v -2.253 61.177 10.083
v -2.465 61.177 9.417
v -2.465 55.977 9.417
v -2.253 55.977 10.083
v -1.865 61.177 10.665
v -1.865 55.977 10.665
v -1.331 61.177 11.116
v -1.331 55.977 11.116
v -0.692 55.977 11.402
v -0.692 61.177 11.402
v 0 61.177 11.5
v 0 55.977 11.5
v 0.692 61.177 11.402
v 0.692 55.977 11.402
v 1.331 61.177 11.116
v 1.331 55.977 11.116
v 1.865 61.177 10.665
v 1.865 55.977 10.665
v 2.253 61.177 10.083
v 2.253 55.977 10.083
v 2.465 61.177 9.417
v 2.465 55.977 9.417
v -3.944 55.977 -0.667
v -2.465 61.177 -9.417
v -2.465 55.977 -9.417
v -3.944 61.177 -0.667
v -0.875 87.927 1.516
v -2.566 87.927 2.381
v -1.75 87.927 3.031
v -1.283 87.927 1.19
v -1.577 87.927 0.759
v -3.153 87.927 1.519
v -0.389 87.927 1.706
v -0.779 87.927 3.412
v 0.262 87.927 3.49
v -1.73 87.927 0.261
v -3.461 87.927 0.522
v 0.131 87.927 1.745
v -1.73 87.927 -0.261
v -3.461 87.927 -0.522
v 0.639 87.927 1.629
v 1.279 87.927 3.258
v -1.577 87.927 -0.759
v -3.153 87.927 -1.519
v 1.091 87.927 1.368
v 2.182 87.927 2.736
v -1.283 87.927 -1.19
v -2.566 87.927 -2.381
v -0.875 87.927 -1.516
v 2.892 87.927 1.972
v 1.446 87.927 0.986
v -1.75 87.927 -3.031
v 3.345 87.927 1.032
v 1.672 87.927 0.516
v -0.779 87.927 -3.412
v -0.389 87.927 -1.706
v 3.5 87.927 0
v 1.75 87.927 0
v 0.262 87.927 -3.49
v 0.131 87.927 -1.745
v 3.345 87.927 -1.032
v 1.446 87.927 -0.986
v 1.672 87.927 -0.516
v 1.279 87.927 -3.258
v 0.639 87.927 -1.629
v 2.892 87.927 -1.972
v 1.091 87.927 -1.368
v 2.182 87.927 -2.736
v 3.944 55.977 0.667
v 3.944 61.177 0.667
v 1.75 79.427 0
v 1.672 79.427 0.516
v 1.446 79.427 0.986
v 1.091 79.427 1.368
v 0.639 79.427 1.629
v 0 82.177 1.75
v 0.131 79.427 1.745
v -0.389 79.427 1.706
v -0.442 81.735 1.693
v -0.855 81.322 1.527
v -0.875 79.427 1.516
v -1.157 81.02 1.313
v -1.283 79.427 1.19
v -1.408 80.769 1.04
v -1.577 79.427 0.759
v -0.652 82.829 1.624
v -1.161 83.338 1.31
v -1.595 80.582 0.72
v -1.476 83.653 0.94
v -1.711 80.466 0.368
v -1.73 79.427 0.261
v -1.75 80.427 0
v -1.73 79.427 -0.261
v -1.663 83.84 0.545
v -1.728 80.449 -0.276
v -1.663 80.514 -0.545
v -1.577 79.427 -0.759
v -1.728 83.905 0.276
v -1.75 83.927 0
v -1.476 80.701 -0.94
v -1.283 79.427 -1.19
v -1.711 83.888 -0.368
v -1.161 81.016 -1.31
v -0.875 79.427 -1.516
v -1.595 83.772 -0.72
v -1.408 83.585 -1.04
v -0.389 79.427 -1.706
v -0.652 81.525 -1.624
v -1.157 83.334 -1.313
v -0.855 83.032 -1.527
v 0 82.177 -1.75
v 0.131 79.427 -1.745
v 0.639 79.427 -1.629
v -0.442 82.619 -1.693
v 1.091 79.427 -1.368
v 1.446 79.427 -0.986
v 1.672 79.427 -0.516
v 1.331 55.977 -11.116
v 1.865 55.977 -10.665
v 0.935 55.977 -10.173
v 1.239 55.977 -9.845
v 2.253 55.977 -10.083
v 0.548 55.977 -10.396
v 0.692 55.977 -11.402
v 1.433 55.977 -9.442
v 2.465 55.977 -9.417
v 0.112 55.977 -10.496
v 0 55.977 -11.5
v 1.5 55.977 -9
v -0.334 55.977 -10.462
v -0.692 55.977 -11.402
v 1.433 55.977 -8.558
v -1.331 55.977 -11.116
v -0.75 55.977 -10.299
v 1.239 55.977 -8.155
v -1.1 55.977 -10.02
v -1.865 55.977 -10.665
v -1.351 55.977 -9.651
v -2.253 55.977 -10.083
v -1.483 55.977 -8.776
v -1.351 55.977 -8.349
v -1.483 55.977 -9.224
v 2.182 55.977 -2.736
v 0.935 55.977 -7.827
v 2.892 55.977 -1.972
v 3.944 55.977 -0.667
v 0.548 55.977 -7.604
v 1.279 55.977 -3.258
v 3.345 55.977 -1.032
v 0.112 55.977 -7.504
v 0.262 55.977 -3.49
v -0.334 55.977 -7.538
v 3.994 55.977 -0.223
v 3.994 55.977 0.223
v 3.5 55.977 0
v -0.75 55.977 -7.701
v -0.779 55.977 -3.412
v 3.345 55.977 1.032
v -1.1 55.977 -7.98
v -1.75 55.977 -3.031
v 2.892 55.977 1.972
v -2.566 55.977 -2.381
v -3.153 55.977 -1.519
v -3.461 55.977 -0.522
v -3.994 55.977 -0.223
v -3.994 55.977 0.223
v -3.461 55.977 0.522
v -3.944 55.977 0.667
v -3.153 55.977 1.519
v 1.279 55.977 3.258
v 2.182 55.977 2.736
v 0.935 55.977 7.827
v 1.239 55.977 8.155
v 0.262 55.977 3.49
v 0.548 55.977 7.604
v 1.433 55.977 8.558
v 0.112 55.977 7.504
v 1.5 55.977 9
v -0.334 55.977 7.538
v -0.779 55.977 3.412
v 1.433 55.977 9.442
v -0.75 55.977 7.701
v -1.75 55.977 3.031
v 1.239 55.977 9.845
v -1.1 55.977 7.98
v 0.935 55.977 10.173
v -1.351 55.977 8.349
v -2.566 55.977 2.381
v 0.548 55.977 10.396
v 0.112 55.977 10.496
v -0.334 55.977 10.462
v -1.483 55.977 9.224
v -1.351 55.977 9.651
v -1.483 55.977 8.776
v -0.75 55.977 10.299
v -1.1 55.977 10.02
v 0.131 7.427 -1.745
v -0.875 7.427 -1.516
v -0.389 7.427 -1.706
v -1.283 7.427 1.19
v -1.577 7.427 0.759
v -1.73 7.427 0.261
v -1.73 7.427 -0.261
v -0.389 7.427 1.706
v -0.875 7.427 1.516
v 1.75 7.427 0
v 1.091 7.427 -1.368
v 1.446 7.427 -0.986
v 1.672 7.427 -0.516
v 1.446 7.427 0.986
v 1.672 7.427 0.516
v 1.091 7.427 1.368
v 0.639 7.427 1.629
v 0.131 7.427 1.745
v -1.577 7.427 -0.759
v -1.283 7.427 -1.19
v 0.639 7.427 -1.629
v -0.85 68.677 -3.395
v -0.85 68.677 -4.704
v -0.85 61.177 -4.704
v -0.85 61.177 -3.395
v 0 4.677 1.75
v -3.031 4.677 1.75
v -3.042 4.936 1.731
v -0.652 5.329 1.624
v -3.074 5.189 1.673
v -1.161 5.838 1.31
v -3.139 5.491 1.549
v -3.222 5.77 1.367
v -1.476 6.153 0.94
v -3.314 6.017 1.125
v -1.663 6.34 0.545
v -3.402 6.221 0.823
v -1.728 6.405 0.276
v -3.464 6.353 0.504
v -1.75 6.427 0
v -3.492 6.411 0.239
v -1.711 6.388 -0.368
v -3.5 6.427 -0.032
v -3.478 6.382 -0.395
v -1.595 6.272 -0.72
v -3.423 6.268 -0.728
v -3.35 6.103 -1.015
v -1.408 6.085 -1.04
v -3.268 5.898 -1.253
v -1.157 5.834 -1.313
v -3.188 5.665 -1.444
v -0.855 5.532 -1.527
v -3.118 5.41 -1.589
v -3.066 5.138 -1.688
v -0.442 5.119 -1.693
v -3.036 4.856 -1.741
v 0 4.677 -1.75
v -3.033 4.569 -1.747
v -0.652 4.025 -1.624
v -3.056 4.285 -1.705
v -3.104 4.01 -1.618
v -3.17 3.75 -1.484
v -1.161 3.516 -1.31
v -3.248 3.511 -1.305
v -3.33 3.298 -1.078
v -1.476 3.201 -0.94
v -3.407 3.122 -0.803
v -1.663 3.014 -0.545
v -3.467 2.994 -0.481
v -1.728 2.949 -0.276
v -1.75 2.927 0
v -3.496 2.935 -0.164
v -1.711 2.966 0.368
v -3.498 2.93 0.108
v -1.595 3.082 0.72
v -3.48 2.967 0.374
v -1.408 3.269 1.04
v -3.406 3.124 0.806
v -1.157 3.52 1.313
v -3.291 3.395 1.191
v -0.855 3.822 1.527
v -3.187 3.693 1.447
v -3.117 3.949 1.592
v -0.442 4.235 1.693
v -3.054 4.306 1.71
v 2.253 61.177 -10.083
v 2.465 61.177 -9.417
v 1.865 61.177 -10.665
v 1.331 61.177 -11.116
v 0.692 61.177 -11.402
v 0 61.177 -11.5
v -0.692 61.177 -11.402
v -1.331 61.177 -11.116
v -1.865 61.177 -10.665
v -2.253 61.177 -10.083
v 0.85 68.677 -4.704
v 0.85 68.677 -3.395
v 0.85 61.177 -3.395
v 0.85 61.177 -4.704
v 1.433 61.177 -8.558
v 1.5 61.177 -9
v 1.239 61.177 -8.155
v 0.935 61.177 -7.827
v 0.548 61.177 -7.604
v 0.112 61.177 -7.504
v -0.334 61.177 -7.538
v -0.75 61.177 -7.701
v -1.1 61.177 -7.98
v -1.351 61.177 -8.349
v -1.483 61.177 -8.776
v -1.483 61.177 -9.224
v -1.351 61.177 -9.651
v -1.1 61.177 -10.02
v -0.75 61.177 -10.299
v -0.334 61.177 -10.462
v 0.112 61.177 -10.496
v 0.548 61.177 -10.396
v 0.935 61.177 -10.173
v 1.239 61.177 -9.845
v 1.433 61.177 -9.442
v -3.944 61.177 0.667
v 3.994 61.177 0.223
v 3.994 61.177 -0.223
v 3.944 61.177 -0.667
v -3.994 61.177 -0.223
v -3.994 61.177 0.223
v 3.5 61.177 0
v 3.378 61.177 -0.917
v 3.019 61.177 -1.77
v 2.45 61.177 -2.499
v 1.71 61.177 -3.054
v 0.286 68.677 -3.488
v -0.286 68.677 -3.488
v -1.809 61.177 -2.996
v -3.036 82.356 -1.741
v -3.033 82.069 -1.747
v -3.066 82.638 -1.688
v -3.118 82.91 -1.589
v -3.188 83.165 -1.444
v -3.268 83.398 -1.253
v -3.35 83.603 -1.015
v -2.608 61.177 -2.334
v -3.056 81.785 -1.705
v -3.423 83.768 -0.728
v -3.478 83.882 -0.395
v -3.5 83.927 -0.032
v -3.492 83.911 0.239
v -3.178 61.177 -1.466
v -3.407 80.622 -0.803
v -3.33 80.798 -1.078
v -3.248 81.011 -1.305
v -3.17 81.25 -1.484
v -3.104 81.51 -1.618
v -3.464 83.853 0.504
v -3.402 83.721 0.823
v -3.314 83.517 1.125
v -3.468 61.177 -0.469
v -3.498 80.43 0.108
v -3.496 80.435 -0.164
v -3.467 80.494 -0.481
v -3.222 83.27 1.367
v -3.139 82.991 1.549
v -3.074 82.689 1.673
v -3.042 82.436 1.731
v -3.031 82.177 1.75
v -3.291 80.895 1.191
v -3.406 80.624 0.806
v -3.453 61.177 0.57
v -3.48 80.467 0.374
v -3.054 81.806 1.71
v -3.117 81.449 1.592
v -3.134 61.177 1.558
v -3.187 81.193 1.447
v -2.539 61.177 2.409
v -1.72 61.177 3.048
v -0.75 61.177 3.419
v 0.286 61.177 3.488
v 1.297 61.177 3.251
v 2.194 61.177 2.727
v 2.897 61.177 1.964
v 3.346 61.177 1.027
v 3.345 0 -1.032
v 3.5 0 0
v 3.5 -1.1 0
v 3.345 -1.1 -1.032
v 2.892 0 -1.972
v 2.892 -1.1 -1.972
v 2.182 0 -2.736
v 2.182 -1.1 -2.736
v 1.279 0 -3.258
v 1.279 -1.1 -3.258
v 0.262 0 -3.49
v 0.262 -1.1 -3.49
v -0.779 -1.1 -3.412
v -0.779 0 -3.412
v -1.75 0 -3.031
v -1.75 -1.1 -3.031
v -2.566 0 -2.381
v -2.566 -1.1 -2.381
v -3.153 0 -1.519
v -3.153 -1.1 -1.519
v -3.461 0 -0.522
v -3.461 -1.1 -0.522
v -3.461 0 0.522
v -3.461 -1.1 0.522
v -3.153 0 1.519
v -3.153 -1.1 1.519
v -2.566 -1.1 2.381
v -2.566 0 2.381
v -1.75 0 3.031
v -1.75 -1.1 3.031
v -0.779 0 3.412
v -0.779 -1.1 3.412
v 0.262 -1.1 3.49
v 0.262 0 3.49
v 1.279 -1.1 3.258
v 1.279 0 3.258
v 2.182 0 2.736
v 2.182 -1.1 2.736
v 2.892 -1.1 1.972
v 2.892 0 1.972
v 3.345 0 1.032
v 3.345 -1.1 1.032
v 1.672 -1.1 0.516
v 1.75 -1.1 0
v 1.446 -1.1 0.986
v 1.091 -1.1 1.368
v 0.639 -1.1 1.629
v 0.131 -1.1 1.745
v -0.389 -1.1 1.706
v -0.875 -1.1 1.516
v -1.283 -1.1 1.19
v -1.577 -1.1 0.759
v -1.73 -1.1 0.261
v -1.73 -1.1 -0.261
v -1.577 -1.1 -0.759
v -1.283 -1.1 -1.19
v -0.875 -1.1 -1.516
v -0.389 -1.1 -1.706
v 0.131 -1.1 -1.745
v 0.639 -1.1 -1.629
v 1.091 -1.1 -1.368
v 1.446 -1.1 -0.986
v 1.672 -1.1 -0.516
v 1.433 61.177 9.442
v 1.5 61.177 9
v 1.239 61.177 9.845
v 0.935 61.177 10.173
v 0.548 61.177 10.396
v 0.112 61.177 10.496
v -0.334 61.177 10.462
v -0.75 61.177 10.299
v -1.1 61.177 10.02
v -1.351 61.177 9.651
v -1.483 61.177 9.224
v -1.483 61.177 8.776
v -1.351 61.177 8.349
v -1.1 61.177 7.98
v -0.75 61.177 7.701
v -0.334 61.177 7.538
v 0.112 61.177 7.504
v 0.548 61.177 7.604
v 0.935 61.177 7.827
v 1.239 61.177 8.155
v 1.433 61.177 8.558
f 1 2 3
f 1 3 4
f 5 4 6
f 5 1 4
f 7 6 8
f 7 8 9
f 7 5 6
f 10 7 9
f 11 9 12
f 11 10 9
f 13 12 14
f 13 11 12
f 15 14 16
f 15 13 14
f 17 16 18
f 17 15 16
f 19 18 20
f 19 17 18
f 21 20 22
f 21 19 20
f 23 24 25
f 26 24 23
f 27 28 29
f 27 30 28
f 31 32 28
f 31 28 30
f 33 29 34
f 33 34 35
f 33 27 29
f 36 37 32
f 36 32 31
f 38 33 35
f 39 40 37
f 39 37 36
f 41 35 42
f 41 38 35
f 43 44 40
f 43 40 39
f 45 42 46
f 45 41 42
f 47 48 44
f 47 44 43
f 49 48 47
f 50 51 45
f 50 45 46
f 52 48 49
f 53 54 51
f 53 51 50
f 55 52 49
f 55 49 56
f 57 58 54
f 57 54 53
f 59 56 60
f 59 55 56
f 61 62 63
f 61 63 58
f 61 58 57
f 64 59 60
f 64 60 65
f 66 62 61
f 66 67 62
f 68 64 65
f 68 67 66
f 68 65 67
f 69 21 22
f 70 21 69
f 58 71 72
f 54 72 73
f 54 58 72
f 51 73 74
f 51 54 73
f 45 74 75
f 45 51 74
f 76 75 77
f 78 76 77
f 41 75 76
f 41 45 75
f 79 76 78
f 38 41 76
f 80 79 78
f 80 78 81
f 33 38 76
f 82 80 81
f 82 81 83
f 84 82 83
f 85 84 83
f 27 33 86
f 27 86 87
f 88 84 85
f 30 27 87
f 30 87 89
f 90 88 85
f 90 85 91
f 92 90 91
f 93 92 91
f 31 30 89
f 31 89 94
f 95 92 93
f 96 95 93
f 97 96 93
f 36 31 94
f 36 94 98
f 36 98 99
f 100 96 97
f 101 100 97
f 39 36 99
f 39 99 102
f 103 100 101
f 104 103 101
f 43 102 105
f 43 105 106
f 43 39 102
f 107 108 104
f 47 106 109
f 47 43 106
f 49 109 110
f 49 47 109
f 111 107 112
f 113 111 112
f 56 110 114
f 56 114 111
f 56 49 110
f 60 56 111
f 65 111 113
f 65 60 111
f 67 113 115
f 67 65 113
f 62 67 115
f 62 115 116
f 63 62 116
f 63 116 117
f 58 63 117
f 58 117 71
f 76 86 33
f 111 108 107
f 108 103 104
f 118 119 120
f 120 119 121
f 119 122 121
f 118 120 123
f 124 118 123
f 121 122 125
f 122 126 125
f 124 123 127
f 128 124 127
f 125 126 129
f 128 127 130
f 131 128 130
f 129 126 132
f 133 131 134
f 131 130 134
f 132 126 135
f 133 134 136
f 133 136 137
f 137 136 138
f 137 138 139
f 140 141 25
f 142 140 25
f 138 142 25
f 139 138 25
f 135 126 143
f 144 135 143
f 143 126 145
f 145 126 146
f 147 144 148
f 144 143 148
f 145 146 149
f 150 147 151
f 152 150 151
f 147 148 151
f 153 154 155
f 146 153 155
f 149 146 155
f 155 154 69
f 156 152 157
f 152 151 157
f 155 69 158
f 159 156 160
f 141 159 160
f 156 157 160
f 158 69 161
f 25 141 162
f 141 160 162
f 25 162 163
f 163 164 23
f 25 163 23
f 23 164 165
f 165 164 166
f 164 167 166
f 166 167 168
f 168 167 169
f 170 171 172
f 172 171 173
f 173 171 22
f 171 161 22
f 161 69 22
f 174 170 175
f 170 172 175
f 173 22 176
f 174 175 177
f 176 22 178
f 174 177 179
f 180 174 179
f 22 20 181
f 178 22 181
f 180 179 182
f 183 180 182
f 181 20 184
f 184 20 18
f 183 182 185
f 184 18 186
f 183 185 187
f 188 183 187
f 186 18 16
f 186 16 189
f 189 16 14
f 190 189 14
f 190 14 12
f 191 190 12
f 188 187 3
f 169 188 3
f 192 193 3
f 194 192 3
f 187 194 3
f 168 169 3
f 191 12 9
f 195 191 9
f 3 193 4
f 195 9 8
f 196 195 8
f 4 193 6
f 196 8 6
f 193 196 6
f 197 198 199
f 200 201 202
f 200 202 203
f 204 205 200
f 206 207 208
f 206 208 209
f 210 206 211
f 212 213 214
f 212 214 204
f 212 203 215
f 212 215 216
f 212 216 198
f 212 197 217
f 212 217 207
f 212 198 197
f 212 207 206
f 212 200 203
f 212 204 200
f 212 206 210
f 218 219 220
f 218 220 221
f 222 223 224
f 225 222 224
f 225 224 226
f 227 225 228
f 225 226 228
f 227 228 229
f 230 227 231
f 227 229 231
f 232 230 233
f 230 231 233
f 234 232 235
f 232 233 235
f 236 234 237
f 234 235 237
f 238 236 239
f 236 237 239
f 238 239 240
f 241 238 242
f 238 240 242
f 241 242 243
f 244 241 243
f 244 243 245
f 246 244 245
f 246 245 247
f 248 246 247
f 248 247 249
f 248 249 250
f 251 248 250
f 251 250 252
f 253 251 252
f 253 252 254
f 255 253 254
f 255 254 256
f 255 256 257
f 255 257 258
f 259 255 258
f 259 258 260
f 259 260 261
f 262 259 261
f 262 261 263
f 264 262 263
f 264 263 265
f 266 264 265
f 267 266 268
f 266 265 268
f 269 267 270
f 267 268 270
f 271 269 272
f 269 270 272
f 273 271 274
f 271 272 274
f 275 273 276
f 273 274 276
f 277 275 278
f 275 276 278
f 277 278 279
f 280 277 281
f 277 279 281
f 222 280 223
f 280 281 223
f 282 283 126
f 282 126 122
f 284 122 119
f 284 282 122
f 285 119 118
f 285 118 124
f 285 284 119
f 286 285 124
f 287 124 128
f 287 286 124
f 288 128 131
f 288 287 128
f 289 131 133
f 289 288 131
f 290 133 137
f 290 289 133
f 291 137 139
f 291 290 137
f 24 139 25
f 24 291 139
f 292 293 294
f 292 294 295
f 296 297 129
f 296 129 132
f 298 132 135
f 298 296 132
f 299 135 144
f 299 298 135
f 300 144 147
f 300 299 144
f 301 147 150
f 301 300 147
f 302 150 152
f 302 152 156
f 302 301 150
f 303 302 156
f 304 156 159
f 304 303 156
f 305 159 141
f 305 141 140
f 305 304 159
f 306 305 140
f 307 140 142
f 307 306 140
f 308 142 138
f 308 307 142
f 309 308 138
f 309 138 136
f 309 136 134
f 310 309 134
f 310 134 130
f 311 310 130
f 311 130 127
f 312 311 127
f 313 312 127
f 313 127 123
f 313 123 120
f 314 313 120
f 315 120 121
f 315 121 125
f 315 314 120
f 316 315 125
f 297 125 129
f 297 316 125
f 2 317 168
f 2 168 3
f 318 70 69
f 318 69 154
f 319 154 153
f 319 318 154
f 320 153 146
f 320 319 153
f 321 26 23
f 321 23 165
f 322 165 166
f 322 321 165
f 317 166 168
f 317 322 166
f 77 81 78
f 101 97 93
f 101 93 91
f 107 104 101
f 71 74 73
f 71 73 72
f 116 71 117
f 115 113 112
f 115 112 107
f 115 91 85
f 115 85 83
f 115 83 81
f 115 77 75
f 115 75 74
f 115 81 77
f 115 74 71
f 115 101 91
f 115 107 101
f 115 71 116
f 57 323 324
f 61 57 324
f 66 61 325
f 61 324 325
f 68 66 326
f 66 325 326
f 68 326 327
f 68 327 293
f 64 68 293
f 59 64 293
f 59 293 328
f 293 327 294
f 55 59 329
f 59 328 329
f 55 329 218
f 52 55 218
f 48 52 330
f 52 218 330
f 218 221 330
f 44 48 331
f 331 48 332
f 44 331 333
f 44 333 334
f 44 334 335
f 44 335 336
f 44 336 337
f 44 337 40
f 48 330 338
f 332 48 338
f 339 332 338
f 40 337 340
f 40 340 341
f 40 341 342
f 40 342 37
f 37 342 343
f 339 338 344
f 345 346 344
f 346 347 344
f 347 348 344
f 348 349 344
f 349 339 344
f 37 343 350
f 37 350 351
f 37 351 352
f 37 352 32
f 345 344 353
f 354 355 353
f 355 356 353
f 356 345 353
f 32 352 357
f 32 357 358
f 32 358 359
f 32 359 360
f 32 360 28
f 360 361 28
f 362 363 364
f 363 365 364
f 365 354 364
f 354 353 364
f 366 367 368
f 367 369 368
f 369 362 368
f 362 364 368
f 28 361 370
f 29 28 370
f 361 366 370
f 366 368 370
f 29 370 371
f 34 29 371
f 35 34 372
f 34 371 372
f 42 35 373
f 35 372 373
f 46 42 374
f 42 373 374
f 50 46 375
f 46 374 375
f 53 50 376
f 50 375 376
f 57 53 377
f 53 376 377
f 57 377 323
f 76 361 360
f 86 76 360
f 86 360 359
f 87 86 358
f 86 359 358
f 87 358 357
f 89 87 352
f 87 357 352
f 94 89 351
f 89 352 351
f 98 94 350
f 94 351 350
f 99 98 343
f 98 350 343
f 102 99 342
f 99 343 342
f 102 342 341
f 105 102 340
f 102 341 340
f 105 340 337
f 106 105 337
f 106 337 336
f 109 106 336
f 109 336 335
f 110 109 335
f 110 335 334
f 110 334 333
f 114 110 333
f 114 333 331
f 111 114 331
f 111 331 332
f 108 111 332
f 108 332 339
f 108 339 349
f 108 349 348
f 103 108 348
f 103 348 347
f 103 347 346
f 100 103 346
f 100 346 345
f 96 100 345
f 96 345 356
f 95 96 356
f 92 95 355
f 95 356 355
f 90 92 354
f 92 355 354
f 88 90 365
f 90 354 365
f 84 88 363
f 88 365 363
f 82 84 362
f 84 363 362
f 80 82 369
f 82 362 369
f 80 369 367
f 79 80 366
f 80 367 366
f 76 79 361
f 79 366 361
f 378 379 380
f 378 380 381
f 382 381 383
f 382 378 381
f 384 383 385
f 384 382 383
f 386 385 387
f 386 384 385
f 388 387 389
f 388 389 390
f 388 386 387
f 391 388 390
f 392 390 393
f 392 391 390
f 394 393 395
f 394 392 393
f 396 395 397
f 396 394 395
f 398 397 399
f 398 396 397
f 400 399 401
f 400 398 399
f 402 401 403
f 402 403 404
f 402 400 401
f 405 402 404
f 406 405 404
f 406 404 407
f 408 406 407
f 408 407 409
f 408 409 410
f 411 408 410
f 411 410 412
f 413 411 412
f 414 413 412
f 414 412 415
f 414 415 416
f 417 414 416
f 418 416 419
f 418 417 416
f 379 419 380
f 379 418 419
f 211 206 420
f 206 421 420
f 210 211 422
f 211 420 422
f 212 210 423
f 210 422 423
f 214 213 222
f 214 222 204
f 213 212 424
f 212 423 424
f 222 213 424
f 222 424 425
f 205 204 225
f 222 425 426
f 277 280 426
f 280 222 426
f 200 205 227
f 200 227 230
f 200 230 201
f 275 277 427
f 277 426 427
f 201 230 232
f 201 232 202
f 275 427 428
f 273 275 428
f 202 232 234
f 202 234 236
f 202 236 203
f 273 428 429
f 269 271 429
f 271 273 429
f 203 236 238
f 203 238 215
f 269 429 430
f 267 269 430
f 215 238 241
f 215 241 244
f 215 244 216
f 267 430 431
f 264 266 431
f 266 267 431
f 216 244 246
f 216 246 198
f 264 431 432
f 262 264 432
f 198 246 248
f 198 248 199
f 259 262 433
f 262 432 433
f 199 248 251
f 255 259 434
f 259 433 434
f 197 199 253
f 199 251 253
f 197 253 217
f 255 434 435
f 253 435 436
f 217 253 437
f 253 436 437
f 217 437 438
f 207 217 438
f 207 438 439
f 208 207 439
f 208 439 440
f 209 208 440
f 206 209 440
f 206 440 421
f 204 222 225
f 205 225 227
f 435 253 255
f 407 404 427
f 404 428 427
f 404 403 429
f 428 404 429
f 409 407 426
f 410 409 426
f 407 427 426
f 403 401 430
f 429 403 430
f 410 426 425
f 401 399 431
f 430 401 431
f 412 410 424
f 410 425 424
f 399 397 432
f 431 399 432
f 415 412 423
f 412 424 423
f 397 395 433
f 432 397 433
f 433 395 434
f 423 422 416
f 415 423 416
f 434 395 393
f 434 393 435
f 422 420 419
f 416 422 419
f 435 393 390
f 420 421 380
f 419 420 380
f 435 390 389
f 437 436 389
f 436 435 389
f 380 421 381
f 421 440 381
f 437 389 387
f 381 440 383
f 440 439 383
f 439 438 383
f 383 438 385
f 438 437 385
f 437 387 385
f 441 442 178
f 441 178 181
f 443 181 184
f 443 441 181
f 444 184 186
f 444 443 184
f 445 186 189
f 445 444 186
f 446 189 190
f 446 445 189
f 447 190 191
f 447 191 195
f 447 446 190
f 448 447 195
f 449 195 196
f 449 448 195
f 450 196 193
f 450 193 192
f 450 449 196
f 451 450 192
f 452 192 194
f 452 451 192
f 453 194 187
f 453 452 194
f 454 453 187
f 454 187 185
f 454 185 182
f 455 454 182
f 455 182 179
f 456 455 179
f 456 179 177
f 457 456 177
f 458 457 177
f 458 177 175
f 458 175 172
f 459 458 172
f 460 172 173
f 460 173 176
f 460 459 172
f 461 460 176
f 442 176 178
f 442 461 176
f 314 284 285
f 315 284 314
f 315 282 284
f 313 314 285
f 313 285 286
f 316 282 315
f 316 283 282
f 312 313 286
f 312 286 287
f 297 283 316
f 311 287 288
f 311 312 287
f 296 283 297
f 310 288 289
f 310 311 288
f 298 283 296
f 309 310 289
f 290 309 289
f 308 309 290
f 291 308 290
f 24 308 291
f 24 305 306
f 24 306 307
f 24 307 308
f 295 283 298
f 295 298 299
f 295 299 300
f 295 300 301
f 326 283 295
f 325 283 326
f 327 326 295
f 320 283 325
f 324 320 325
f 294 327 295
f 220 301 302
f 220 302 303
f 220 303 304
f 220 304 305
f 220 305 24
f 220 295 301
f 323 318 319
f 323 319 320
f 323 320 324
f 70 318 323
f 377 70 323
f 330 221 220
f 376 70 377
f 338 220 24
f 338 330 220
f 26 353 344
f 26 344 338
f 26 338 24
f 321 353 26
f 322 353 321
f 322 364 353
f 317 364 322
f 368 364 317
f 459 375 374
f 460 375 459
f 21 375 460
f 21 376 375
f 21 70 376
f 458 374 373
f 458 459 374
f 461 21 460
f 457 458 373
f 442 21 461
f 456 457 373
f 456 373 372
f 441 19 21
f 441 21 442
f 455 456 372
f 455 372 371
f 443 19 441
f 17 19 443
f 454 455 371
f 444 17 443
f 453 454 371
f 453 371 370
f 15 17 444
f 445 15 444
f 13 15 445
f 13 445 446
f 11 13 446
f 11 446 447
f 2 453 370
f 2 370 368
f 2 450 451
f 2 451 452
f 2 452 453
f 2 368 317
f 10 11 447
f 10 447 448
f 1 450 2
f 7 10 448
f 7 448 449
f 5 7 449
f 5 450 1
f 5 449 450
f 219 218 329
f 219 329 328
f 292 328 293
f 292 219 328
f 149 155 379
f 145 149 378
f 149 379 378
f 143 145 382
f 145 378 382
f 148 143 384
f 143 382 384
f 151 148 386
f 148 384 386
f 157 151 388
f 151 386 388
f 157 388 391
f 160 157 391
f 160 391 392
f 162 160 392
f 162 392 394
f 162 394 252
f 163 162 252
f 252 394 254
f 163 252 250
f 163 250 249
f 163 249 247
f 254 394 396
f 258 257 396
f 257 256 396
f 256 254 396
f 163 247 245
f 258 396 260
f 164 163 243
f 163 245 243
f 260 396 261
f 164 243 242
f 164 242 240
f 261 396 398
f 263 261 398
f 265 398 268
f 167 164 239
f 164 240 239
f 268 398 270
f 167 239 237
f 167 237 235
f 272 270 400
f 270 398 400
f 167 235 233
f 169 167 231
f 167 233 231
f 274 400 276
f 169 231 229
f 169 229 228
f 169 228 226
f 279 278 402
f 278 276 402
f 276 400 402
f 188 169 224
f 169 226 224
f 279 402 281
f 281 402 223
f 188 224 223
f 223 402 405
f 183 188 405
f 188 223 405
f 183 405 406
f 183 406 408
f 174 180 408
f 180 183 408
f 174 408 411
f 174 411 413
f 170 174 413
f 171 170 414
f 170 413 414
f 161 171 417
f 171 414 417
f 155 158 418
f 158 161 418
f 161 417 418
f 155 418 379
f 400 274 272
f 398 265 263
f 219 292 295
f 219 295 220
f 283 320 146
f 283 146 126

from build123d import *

# Parameters (mm, degrees)
SKETCH1_R           = 3.5
BOSS_EXTRUDE1_DEPTH = 87.927
SKETCH2_R           = 1.75
CUT_EXTRUDE1_DEPTH  = 8.9
CUT_EXTRUDE2_START  = -87.927
SKETCH2_2_R         = 1.75
CUT_EXTRUDE2_DEPTH  = 8.9
CUT_EXTRUDE3_REACH  = 9
SKETCH3_R           = 1.75
BOSS_EXTRUDE2_DEPTH = 7.5
SKETCH5_R           = 1.5
SKETCH5_R_2         = 3.5
BOSS_EXTRUDE3_DEPTH = 5.2
SKETCH6_R           = 3.5
SKETCH6_R_2         = 1.75
BOSS_EXTRUDE5_DEPTH = 1.1
SKETCH7_R           = 1.75
BOSS_EXTRUDE6_DEPTH = 0.4
SKETCH8_R           = 1.75
BOSS_EXTRUDE7_DEPTH = 1.473


with BuildPart() as part:
    # Sketch1 → Boss-Extrude1 (new body)
    with BuildSketch(Plane(origin=(0, 0, 0), x_dir=(1, 0, 0), z_dir=(0, 1, 0))):
        Circle(SKETCH1_R)
    extrude(amount=BOSS_EXTRUDE1_DEPTH)

    # Sketch2 → Cut-Extrude1 (cut)
    with BuildSketch(Plane.XZ):
        Circle(SKETCH2_R)
    extrude(amount=-CUT_EXTRUDE1_DEPTH, mode=Mode.SUBTRACT)

    # Sketch2<2> → Cut-Extrude2 (cut)
    with BuildSketch(Plane.XZ.offset(CUT_EXTRUDE2_START)):
        Circle(SKETCH2_2_R)
    extrude(amount=CUT_EXTRUDE2_DEPTH, mode=Mode.SUBTRACT)

    # Sketch3 → Cut-Extrude3 (cut, up to next)
    with BuildSketch(Plane.ZY.offset(3.5), mode=Mode.PRIVATE) as cut_extrude3_sk1:
        with Locations((0, 4.677)):
            Circle(SKETCH3_R)
    cut_extrude3_tool1 = extrude(cut_extrude3_sk1.sketch, amount=-CUT_EXTRUDE3_REACH, mode=Mode.PRIVATE) & part.part
    add(cut_extrude3_tool1.solids().sort_by_distance((-3.5, 4.677, 0))[0], mode=Mode.SUBTRACT)
    # Sketch3 → Cut-Extrude3 (cut, up to next)
    with BuildSketch(Plane.ZY.offset(3.5), mode=Mode.PRIVATE) as cut_extrude3_sk2:
        with Locations((0, 82.177)):
            Circle(SKETCH3_R)
    cut_extrude3_tool2 = extrude(cut_extrude3_sk2.sketch, amount=-CUT_EXTRUDE3_REACH, mode=Mode.PRIVATE) & part.part
    add(cut_extrude3_tool2.solids().sort_by_distance((-3.5, 82.177, 0))[0], mode=Mode.SUBTRACT)

    # Sketch4 → Boss-Extrude2 (add)
    with BuildSketch(Plane(origin=(0, 68.677, 0), x_dir=(1, 0, 0), z_dir=(0, 1, 0))):
        with BuildLine():
            Line((0.85, 3.240370349), (0.85, 4.704101966))
            Line((0.85, 4.704101966), (-0.85, 4.704101966))
            Line((-0.85, 4.704101966), (-0.85, 3.240370349))
            ThreePointArc((-0.85, 3.240370349), (0, -3.35), (0.85, 3.240370349))
        make_face()
    extrude(amount=-BOSS_EXTRUDE2_DEPTH)

    # Sketch5 → Boss-Extrude3 (add)
    with BuildSketch(Plane.XZ.offset(-61.177)):
        with BuildLine():
            Line((-3.944053189, 0.666666667), (-2.465033243, 9.416666667))
            ThreePointArc((-2.465033243, 9.416666667), (0, 11.5), (2.465033243, 9.416666667))
            Line((2.465033243, 9.416666667), (3.944053189, 0.666666667))
            ThreePointArc((3.944053189, 0.666666667), (4, 0), (3.944053189, -0.666666667))
            Line((3.944053189, -0.666666667), (2.465033243, -9.416666667))
            ThreePointArc((2.465033243, -9.416666667), (0, -11.5), (-2.465033243, -9.416666667))
            Line((-2.465033243, -9.416666667), (-3.944053189, -0.666666667))
            ThreePointArc((-3.944053189, -0.666666667), (-4, 0), (-3.944053189, 0.666666667))
        make_face()
        with Locations((0, 9)):
            Circle(SKETCH5_R, mode=Mode.SUBTRACT)
        Circle(SKETCH5_R_2, mode=Mode.SUBTRACT)
        with Locations((0, -9)):
            Circle(SKETCH5_R, mode=Mode.SUBTRACT)
    extrude(amount=BOSS_EXTRUDE3_DEPTH)

    # Sketch6 → Boss-Extrude5 (add)
    with BuildSketch(Plane(origin=(0, 0, 0), x_dir=(1, 0, 0), z_dir=(0, 1, 0))):
        Circle(SKETCH6_R)
        Circle(SKETCH6_R_2, mode=Mode.SUBTRACT)
    extrude(amount=-BOSS_EXTRUDE5_DEPTH)

    # Sketch7 → Boss-Extrude6 (add)
    with BuildSketch(Plane(origin=(0, 79.027, 0), x_dir=(1, 0, 0), z_dir=(0, 1, 0))):
        Circle(SKETCH7_R)
    extrude(amount=BOSS_EXTRUDE6_DEPTH)

    # Sketch8 → Boss-Extrude7 (add)
    with BuildSketch(Plane.XZ.offset(-8.9)):
        Circle(SKETCH8_R)
    extrude(amount=BOSS_EXTRUDE7_DEPTH)


solid = part.part
